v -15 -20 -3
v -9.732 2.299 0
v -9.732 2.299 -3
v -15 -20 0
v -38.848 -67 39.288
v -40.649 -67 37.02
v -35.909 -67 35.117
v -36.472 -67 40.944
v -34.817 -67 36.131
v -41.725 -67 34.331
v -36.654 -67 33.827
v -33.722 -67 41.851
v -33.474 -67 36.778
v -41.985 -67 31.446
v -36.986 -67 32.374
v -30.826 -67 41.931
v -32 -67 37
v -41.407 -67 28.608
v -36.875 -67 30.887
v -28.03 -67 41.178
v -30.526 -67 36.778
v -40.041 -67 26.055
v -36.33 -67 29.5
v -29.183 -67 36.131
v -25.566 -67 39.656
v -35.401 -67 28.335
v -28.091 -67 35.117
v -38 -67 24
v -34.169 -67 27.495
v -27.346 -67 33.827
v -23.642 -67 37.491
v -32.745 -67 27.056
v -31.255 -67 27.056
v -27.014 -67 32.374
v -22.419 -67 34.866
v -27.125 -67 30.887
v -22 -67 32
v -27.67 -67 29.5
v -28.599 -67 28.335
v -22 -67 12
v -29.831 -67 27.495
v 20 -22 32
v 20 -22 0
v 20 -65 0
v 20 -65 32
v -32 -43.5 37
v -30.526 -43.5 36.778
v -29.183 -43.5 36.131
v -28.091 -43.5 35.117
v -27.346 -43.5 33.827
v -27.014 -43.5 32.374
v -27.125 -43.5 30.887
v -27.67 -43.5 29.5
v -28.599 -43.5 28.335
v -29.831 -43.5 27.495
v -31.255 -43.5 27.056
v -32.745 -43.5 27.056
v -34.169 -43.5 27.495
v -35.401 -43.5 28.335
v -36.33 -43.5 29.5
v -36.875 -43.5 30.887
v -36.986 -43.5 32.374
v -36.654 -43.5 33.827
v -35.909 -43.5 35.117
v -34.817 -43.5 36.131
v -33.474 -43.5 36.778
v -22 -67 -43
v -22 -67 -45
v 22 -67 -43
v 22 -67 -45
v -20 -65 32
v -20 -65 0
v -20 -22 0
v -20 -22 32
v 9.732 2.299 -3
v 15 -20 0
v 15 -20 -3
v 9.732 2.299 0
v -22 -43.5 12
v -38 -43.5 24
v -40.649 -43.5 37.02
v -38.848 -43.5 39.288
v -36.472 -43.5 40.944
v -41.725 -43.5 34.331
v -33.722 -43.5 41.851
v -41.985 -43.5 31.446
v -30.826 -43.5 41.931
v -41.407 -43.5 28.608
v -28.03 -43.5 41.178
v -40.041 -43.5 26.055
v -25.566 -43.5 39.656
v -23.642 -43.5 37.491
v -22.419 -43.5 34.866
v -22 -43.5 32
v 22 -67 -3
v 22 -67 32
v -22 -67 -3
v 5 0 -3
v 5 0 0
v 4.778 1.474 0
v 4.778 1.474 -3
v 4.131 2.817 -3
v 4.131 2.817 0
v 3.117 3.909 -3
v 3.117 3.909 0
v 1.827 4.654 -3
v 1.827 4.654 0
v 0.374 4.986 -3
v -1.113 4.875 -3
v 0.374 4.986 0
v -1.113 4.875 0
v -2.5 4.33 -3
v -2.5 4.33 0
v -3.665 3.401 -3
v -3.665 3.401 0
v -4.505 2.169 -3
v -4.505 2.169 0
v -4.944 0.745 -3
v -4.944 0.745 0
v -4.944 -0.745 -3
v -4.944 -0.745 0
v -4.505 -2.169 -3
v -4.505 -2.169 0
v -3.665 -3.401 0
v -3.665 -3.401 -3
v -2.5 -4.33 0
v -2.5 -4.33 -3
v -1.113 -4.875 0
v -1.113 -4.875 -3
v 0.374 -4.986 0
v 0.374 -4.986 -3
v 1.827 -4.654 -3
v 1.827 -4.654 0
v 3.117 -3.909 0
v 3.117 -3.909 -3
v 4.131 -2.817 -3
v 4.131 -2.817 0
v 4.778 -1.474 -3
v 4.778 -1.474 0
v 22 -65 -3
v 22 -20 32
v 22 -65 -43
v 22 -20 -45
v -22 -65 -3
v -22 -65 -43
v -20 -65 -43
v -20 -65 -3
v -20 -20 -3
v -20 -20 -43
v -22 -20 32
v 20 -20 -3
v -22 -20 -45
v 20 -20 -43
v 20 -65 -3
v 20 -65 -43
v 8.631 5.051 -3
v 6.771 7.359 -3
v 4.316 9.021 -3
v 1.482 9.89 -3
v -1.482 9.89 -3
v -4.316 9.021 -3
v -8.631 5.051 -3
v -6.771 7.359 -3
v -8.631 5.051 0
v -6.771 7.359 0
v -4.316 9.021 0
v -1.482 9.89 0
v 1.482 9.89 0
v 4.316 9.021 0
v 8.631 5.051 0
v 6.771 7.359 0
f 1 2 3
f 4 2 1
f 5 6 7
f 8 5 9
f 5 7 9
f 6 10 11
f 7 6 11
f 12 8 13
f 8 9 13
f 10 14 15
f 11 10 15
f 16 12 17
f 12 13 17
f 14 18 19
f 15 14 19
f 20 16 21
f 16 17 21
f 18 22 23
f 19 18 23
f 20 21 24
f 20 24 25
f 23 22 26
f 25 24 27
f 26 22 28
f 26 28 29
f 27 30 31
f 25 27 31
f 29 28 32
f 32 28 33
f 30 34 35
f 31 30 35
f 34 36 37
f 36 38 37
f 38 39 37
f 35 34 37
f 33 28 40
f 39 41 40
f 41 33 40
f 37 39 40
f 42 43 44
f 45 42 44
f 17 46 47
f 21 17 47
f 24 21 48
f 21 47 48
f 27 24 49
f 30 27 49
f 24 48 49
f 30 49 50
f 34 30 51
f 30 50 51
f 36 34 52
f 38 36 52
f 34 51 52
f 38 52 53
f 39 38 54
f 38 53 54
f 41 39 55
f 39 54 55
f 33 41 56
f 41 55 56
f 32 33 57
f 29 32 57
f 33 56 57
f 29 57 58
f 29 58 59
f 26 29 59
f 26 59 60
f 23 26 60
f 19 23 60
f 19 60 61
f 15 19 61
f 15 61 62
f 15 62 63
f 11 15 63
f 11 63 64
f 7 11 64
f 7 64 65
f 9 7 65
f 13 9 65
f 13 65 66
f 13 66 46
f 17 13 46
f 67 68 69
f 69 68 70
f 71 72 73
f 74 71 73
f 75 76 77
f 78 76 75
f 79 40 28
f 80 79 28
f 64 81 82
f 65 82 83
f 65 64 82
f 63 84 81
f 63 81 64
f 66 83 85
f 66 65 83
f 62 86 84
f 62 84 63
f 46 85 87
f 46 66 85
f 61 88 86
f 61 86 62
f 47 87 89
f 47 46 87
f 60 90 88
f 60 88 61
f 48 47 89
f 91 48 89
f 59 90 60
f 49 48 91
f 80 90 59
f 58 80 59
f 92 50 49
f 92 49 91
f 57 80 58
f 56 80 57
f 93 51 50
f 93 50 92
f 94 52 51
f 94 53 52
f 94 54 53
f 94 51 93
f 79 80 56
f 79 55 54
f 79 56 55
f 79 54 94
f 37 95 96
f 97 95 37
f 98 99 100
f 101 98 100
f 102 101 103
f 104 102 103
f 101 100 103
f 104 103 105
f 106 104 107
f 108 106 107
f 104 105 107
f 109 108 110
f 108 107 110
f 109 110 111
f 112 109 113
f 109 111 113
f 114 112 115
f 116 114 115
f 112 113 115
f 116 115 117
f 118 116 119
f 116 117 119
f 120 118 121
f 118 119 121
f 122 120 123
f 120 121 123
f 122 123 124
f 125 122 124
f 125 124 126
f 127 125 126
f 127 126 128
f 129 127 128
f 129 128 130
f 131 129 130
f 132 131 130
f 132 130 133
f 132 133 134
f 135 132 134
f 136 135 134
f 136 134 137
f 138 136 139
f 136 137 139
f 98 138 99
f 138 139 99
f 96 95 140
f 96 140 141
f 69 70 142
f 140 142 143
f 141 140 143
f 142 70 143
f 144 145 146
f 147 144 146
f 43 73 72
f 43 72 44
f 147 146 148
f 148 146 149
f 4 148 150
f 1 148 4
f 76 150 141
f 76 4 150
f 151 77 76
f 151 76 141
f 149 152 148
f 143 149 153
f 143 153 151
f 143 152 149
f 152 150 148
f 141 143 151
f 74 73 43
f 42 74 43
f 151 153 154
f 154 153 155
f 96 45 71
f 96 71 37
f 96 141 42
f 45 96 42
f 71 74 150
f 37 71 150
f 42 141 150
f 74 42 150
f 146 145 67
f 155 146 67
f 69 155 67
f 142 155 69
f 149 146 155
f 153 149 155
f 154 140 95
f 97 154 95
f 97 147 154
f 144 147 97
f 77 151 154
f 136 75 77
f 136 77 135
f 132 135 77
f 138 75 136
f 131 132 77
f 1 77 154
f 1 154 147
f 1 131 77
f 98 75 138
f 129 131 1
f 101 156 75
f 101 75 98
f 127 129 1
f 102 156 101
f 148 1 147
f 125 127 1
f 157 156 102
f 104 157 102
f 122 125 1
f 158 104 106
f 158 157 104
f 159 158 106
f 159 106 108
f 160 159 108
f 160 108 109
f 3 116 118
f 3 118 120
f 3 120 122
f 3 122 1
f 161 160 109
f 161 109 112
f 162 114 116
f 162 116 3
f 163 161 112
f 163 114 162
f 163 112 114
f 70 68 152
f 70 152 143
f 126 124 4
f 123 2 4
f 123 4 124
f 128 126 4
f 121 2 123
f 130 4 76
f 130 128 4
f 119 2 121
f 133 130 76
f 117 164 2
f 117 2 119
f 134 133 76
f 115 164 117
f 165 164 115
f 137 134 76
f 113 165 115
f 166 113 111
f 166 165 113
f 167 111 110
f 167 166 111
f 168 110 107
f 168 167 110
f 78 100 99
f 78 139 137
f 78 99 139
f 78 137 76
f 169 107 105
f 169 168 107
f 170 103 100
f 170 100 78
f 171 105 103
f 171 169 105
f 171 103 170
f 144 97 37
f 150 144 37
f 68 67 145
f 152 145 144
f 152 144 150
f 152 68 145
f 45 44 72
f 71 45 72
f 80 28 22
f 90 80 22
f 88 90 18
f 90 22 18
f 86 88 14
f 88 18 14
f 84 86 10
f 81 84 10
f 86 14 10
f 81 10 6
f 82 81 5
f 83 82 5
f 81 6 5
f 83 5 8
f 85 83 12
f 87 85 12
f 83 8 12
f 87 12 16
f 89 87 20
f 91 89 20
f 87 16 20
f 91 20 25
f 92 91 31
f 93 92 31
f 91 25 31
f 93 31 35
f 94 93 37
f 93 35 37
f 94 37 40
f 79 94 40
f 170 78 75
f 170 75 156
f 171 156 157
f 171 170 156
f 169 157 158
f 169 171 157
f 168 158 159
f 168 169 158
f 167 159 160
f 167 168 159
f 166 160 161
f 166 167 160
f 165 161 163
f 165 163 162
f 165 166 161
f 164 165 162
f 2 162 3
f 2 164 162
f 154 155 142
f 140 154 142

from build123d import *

# Parameters (mm, degrees)
SKETCH1_R                = 5
BOSS_EXTRUDE1_DEPTH      = 3
BOSS_EXTRUDE2_DEPTH      = 35
BOSS_EXTRUDE2_DEPTH_BACK = 40
BOSS_EXTRUDE2_START      = -3
SKETCH1_3_W              = 2
SKETCH1_3_H              = 45
SKETCH1_3_H_2            = 2
BOSS_EXTRUDE6_START      = -3
BOSS_EXTRUDE6_DEPTH      = 35
BOSS_EXTRUDE8_START      = -45
SKETCH1_7_W              = 44
SKETCH1_7_H              = 47
BOSS_EXTRUDE8_DEPTH      = 2
BOSS_EXTRUDE9_START      = -3
SKETCH1_8_W              = 2
SKETCH1_8_H              = 2
BOSS_EXTRUDE9_DEPTH      = 35
BOSS_EXTRUDE10_START     = -67
BOSS_EXTRUDE10_DEPTH     = 23.5
CUT_EXTRUDE1_START       = -43.5
SKETCH6_4_R              = 5
CUT_EXTRUDE1_DEPTH       = 48.48351499


with BuildPart() as part:
    # Sketch1 → Boss-Extrude1 (new body)
    with BuildSketch(Plane.XY):
        with BuildLine():
            Line((-9.732121112, 2.299090834), (-15, -20))
            Line((-15, -20), (-20, -20))
            Line((-20, -20), (-20, -65))
            Line((-20, -65), (20, -65))
            Line((20, -65), (20, -20))
            Line((20, -20), (15, -20))
            Line((15, -20), (9.732121112, 2.299090834))
            ThreePointArc((9.732121112, 2.299090834), (0, 10), (-9.732121112, 2.299090834))
        make_face()
        Circle(SKETCH1_R, mode=Mode.SUBTRACT)
    extrude(amount=-BOSS_EXTRUDE1_DEPTH)

    # Sketch1<3> → Boss-Extrude2 (add, two sides: drawn at the far end of the back side and taken through both)
    with BuildSketch(Plane.XY.offset(BOSS_EXTRUDE2_START - BOSS_EXTRUDE2_DEPTH_BACK)):
        with Locations((-21, -42.5)):
            Rectangle(SKETCH1_3_W, SKETCH1_3_H)
        with Locations((21, -42.5)):
            Rectangle(SKETCH1_3_W, SKETCH1_3_H)
        with Locations((-21, -21)):
            Rectangle(SKETCH1_3_W, SKETCH1_3_H_2)
        with Locations((21, -21)):
            Rectangle(SKETCH1_3_W, SKETCH1_3_H_2)
    extrude(amount=BOSS_EXTRUDE2_DEPTH + BOSS_EXTRUDE2_DEPTH_BACK)

    # Sketch1<4> → Boss-Extrude6 (add)
    with BuildSketch(Plane.XY.offset(BOSS_EXTRUDE6_START)):
        Polygon((22, -65), (22, -67), (-22, -67), (-22, -65), (-20, -65), (20, -65), align=None)
    extrude(amount=BOSS_EXTRUDE6_DEPTH)

    # Sketch1<7> → Boss-Extrude8 (add)
    with BuildSketch(Plane.XY.offset(BOSS_EXTRUDE8_START)):
        with Locations((0, -43.5)):
            Rectangle(SKETCH1_7_W, SKETCH1_7_H)
    extrude(amount=BOSS_EXTRUDE8_DEPTH)

    # Sketch1<8> → Boss-Extrude9 (add)
    with BuildSketch(Plane.XY.offset(BOSS_EXTRUDE9_START)):
        Polygon((15, -20), (-15, -20), (-20, -20), (-20, -22), (20, -22), (20, -20), align=None)
        with Locations((21, -21)):
            Rectangle(SKETCH1_8_W, SKETCH1_8_H)
        with Locations((-21, -21)):
            Rectangle(SKETCH1_8_W, SKETCH1_8_H)
    extrude(amount=BOSS_EXTRUDE9_DEPTH)


with BuildPart() as body_2:
    # Sketch6 → Boss-Extrude10 (new body)
    with BuildSketch(Plane(origin=(0, 0, 0), x_dir=(1, 0, 0), z_dir=(0, 1, 0)).offset(BOSS_EXTRUDE10_START)):
        with BuildLine():
            Line((-22, -12), (-38, -24))
            ThreePointArc((-38, -24), (-36.472135955, -40.94427191), (-22, -32))
            Line((-22, -32), (-22, -12))
        make_face()
    extrude(amount=BOSS_EXTRUDE10_DEPTH)

    # Sketch6<4> → Cut-Extrude1 (cut, through all)
    with BuildSketch(Plane(origin=(0, 0, 0), x_dir=(1, 0, 0), z_dir=(0, 1, 0)).offset(CUT_EXTRUDE1_START)):
        with Locations(Location((-32, -32, 0), (0, 0, 270))):
            Circle(SKETCH6_4_R)
    extrude(amount=-CUT_EXTRUDE1_DEPTH, mode=Mode.SUBTRACT)


solid = Compound([part.part, body_2.part])
